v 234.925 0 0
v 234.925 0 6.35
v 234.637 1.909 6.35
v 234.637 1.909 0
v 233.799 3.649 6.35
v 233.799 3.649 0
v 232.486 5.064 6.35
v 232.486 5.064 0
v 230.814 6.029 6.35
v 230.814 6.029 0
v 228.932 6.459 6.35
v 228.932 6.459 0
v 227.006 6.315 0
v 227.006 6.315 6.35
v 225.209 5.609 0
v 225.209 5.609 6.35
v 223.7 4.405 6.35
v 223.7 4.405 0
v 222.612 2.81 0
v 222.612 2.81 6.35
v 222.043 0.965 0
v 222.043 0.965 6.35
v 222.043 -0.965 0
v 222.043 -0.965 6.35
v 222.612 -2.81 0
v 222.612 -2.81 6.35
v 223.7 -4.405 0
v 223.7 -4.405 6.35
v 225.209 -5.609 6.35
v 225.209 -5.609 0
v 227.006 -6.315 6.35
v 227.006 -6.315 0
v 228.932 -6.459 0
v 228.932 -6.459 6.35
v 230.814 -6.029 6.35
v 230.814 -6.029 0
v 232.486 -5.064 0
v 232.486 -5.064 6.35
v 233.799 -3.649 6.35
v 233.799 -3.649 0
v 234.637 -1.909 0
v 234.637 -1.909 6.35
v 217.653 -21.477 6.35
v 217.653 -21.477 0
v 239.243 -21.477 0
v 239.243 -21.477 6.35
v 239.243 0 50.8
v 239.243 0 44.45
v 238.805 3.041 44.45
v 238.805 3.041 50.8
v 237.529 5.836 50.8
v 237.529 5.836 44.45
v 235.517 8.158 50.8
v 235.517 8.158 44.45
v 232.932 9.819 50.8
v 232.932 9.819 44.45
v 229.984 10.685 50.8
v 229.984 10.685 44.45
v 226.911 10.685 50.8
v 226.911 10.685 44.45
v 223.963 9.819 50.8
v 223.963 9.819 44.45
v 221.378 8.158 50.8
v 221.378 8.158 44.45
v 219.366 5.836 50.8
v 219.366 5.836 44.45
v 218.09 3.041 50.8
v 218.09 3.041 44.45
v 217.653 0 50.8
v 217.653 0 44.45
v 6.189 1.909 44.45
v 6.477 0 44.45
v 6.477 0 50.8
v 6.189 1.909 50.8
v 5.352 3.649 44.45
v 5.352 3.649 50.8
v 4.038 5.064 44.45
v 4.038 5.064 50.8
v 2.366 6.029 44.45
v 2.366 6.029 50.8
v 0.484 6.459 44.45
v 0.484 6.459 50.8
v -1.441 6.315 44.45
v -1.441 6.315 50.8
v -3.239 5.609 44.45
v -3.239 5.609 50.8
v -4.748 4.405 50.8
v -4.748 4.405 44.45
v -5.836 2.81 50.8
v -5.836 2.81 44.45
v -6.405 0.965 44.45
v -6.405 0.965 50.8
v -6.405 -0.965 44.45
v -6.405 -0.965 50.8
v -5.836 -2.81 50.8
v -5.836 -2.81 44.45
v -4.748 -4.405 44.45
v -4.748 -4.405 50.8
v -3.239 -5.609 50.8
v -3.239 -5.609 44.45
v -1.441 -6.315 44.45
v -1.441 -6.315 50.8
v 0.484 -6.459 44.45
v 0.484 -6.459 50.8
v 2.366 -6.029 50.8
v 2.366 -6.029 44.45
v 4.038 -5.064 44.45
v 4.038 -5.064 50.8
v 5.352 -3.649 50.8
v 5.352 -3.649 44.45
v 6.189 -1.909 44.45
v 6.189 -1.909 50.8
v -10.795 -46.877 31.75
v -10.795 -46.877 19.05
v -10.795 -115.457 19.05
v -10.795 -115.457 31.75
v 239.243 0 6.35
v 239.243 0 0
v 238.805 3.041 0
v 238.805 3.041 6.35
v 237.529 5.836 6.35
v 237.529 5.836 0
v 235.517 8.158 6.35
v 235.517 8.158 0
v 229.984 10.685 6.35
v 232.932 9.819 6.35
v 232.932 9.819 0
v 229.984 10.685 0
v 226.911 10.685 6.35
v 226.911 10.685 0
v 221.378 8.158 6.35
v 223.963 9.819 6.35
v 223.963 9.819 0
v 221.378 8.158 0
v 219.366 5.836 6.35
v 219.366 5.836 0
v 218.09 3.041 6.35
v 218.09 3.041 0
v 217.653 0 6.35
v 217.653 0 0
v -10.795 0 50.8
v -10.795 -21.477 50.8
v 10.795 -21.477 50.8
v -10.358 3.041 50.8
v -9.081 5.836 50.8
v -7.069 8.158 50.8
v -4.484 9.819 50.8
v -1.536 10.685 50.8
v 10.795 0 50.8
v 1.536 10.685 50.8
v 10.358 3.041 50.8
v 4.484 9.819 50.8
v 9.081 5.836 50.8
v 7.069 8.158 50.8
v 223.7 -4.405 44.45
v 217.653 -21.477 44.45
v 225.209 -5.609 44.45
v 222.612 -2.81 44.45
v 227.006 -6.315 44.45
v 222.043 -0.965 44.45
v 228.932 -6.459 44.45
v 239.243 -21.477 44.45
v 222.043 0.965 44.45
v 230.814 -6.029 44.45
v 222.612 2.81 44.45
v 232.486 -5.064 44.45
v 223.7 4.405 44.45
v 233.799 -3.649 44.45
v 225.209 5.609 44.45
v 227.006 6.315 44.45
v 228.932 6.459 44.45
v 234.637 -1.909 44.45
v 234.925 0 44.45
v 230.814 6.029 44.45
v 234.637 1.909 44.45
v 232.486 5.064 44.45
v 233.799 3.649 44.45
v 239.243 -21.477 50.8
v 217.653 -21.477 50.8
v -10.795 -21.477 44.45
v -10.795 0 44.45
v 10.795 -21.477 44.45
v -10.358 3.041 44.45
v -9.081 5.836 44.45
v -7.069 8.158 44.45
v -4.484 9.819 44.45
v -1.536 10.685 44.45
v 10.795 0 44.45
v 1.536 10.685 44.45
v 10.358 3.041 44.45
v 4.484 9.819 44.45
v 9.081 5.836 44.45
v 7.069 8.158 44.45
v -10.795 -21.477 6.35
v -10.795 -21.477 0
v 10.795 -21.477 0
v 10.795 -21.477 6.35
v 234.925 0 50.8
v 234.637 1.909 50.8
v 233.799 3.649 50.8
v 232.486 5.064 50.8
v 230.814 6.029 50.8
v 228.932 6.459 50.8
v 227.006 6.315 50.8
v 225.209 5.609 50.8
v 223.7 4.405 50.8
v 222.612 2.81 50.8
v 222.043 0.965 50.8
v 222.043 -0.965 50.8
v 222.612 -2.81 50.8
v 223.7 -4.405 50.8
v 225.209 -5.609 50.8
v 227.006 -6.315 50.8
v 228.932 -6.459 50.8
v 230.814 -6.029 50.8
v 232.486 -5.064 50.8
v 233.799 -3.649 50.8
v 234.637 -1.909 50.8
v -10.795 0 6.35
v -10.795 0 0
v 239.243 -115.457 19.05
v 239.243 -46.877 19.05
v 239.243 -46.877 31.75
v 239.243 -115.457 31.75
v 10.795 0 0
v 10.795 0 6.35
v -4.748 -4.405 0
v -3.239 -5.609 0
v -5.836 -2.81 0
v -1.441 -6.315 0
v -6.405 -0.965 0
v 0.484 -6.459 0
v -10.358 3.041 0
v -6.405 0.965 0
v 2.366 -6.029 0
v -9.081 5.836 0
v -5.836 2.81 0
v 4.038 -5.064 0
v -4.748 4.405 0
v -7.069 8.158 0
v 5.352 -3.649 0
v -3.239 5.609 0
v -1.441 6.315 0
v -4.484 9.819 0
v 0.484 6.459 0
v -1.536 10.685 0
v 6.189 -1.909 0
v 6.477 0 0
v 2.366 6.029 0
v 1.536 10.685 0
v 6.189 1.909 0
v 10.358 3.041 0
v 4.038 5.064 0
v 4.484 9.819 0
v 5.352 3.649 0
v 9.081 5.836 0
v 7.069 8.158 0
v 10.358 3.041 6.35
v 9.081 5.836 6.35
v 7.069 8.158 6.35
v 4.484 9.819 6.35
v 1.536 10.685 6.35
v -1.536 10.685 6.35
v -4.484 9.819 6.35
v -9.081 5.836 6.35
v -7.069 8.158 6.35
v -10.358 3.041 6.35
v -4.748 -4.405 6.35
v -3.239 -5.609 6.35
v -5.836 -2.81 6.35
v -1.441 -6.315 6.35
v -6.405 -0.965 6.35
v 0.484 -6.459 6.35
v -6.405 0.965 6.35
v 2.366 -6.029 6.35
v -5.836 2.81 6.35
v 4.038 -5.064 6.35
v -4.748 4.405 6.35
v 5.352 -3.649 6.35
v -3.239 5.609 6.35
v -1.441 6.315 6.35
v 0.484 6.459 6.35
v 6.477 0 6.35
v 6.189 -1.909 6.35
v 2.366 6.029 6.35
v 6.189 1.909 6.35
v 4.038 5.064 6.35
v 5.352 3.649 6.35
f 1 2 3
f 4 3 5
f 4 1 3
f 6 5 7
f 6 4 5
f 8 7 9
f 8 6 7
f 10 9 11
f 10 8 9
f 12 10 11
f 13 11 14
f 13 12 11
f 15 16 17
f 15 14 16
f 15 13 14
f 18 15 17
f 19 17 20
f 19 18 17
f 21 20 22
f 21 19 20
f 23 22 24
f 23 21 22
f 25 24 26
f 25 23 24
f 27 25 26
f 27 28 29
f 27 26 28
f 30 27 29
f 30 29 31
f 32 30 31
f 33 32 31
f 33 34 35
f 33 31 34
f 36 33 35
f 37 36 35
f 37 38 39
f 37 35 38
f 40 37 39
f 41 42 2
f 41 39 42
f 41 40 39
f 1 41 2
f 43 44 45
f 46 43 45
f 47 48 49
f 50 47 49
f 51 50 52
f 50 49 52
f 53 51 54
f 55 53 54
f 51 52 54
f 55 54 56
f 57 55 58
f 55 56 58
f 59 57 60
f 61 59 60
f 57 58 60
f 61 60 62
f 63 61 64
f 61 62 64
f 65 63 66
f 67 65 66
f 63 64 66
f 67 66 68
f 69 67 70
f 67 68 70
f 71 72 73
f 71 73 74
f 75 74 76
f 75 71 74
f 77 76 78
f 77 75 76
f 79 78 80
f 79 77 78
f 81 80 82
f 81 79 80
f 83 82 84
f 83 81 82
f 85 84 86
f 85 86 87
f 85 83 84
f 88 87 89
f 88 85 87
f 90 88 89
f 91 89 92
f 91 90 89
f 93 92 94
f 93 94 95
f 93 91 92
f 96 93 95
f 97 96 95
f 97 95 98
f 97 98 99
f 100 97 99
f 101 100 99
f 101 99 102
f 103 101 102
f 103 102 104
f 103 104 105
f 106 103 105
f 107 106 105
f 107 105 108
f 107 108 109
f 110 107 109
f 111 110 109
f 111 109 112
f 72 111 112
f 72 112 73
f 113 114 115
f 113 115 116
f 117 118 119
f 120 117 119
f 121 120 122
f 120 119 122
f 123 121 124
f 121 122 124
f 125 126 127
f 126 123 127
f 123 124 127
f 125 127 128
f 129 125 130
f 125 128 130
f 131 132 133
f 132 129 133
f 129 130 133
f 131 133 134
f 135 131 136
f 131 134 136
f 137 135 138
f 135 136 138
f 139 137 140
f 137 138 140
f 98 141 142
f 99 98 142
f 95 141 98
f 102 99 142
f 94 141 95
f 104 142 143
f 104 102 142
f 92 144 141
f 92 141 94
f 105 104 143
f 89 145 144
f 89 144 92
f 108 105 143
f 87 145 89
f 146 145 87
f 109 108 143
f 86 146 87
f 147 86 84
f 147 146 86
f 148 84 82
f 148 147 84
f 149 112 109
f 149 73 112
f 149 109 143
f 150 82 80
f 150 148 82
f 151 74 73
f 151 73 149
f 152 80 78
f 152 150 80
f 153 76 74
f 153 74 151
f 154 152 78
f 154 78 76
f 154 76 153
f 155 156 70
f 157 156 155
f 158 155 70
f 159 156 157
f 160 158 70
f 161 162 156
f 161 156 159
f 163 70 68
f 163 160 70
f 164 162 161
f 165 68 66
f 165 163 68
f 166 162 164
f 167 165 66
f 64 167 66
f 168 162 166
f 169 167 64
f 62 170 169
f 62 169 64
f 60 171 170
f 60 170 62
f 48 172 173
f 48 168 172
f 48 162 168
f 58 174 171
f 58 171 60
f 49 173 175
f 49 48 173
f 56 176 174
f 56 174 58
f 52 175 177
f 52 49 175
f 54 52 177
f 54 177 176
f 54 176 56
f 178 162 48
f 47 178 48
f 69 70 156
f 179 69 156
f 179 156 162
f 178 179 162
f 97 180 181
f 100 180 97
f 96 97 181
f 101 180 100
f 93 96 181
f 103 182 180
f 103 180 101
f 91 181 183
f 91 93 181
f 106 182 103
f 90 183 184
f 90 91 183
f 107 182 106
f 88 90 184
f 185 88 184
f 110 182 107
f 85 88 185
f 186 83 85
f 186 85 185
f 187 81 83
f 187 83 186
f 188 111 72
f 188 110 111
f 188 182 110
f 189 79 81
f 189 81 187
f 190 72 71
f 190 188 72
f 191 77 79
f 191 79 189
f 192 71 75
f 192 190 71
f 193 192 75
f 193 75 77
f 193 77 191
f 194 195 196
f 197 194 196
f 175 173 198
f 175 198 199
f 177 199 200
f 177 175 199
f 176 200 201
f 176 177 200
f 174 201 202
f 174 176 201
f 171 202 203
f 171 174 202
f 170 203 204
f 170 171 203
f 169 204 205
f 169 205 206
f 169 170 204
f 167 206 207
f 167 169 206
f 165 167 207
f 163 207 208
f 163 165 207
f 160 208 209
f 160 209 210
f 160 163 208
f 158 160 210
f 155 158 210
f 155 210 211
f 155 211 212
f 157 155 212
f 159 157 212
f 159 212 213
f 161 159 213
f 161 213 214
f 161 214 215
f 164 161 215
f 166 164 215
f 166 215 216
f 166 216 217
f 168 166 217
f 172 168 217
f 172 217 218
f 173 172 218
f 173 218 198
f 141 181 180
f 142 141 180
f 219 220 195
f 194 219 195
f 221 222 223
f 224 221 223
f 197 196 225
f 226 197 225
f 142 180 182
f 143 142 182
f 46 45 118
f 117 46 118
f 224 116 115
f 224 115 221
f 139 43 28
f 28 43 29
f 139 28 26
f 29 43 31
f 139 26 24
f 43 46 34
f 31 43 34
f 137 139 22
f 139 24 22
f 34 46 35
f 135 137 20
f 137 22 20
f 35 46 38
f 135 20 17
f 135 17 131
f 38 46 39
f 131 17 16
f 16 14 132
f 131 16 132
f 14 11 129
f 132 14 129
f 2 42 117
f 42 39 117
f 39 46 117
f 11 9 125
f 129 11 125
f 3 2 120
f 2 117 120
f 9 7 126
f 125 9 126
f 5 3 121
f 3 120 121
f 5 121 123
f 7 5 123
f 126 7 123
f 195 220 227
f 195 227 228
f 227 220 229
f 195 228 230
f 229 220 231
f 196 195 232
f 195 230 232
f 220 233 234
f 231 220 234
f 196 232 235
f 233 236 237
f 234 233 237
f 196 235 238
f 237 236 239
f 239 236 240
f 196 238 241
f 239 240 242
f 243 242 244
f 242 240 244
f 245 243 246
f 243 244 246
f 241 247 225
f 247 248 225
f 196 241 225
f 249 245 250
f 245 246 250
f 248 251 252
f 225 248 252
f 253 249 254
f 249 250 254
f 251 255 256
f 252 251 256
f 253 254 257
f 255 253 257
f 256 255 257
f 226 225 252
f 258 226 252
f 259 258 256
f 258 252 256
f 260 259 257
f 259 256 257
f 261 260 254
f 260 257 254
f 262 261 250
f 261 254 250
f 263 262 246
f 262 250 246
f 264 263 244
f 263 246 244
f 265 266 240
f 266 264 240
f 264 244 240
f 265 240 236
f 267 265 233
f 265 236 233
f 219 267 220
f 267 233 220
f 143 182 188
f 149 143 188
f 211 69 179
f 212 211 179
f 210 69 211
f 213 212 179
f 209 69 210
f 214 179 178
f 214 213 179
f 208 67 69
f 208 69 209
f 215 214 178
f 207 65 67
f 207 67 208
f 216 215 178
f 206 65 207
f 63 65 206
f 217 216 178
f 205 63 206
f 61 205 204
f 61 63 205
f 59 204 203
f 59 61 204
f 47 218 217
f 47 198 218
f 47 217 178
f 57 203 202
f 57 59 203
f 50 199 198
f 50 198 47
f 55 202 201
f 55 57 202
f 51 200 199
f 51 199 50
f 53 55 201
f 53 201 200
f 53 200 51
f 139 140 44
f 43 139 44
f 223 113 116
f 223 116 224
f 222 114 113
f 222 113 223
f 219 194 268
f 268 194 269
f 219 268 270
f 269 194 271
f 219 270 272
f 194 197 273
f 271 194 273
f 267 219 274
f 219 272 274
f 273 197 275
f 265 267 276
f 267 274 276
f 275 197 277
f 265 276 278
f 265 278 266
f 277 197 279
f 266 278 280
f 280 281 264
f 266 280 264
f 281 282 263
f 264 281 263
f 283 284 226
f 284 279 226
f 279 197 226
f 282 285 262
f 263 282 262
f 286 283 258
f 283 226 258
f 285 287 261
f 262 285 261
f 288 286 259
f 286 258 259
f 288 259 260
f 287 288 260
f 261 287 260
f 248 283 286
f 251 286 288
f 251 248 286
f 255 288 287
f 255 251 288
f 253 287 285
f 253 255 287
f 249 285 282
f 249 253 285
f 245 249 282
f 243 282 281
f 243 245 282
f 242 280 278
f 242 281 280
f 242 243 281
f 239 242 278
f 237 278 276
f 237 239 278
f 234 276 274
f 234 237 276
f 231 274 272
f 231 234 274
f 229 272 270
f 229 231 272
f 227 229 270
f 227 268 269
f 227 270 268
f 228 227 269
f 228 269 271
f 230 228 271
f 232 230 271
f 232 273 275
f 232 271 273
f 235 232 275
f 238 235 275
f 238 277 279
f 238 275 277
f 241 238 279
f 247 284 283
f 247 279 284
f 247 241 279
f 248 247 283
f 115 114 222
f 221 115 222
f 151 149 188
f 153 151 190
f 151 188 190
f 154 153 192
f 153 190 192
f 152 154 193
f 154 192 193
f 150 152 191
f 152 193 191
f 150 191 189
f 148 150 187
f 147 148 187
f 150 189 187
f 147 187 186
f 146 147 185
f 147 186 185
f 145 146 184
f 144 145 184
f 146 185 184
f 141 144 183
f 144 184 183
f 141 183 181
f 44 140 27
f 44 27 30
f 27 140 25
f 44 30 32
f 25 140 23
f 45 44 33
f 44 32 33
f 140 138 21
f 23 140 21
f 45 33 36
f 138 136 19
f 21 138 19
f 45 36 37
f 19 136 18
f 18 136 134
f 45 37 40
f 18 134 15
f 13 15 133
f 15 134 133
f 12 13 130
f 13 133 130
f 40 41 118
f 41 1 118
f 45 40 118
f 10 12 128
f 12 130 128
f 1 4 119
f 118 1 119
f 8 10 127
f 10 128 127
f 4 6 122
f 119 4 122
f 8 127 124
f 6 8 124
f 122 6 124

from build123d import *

# Parameters (mm, degrees)
SKETCH2_R             = 6.477
BOSS_EXTRUDE1_DEPTH   = 50.8
BOSS_EXTRUDE1_2_DEPTH = 50.8
SKETCH6_W             = 38.1
SKETCH6_H             = 36.341758233
CUT_EXTRUDE2_DEPTH    = 267.208
SKETCH9_W             = 250.0376
SKETCH9_H             = 12.7
BOSS_EXTRUDE2_DEPTH   = 93.98
SKETCH10_W            = 250.0376
SKETCH10_H            = 12.7
CUT_EXTRUDE3_DEPTH    = 25.4


with BuildPart() as part:
    # Sketch2 → Boss-Extrude1 (new body)
    with BuildSketch(Plane.XY):
        with BuildLine():
            Line((-10.795, 0), (-10.795, -21.477155865))
            Line((-10.795, -21.477155865), (10.795, -21.477155865))
            Line((10.795, -21.477155865), (10.795, 0))
            ThreePointArc((10.795, 0), (0, 10.795), (-10.795, 0))
        make_face()
        Circle(SKETCH2_R, mode=Mode.SUBTRACT)
    extrude(amount=BOSS_EXTRUDE1_DEPTH)


with BuildPart() as body_2:
    # Sketch2 → Boss-Extrude1 2 (new body)
    with BuildSketch(Plane.XY):
        with BuildLine():
            Line((217.6526, 0), (217.6526, -21.477155865))
            Line((217.6526, -21.477155865), (239.2426, -21.477155865))
            Line((239.2426, -21.477155865), (239.2426, 0))
            ThreePointArc((239.2426, 0), (228.4476, 10.795), (217.6526, 0))
        make_face()
        with Locations((228.4476, 0)):
            Circle(SKETCH2_R, mode=Mode.SUBTRACT)
    extrude(amount=BOSS_EXTRUDE1_2_DEPTH)


with BuildPart() as cut_extrude2_tool:
    # Sketch6 → Cut-Extrude2 (new body)
    with BuildSketch(Plane(origin=(239.2426, 0, 0), x_dir=(0, 0, -1), z_dir=(1, 0, 0))):
        with Locations((-25.4, -3.306276748)):
            Rectangle(SKETCH6_W, SKETCH6_H)
    extrude(amount=-CUT_EXTRUDE2_DEPTH)


with BuildPart() as part_1:
    add(part.part)

    # Cut-Extrude2: cut by cut_extrude2_tool
    add(cut_extrude2_tool.part, mode=Mode.SUBTRACT)


with BuildPart() as body_2_1:
    add(body_2.part)

    # Cut-Extrude2: cut by cut_extrude2_tool
    add(cut_extrude2_tool.part, mode=Mode.SUBTRACT)


with BuildPart() as body_3:
    # Sketch9 → Boss-Extrude2 (new body)
    with BuildSketch(Plane.XZ.offset(21.477155865)):
        with Locations((114.2238, 25.4)):
            Rectangle(SKETCH9_W, SKETCH9_H)
    extrude(amount=BOSS_EXTRUDE2_DEPTH)

    # Sketch10 → Cut-Extrude3 (cut)
    with BuildSketch(Plane(origin=(0, -21.477155865, 0), x_dir=(1, 0, 0), z_dir=(0, 1, 0))):
        with Locations((114.2238, -25.4)):
            Rectangle(SKETCH10_W, SKETCH10_H)
    extrude(amount=-CUT_EXTRUDE3_DEPTH, mode=Mode.SUBTRACT)


solid = Compound([part_1.part, body_2_1.part, body_3.part])
